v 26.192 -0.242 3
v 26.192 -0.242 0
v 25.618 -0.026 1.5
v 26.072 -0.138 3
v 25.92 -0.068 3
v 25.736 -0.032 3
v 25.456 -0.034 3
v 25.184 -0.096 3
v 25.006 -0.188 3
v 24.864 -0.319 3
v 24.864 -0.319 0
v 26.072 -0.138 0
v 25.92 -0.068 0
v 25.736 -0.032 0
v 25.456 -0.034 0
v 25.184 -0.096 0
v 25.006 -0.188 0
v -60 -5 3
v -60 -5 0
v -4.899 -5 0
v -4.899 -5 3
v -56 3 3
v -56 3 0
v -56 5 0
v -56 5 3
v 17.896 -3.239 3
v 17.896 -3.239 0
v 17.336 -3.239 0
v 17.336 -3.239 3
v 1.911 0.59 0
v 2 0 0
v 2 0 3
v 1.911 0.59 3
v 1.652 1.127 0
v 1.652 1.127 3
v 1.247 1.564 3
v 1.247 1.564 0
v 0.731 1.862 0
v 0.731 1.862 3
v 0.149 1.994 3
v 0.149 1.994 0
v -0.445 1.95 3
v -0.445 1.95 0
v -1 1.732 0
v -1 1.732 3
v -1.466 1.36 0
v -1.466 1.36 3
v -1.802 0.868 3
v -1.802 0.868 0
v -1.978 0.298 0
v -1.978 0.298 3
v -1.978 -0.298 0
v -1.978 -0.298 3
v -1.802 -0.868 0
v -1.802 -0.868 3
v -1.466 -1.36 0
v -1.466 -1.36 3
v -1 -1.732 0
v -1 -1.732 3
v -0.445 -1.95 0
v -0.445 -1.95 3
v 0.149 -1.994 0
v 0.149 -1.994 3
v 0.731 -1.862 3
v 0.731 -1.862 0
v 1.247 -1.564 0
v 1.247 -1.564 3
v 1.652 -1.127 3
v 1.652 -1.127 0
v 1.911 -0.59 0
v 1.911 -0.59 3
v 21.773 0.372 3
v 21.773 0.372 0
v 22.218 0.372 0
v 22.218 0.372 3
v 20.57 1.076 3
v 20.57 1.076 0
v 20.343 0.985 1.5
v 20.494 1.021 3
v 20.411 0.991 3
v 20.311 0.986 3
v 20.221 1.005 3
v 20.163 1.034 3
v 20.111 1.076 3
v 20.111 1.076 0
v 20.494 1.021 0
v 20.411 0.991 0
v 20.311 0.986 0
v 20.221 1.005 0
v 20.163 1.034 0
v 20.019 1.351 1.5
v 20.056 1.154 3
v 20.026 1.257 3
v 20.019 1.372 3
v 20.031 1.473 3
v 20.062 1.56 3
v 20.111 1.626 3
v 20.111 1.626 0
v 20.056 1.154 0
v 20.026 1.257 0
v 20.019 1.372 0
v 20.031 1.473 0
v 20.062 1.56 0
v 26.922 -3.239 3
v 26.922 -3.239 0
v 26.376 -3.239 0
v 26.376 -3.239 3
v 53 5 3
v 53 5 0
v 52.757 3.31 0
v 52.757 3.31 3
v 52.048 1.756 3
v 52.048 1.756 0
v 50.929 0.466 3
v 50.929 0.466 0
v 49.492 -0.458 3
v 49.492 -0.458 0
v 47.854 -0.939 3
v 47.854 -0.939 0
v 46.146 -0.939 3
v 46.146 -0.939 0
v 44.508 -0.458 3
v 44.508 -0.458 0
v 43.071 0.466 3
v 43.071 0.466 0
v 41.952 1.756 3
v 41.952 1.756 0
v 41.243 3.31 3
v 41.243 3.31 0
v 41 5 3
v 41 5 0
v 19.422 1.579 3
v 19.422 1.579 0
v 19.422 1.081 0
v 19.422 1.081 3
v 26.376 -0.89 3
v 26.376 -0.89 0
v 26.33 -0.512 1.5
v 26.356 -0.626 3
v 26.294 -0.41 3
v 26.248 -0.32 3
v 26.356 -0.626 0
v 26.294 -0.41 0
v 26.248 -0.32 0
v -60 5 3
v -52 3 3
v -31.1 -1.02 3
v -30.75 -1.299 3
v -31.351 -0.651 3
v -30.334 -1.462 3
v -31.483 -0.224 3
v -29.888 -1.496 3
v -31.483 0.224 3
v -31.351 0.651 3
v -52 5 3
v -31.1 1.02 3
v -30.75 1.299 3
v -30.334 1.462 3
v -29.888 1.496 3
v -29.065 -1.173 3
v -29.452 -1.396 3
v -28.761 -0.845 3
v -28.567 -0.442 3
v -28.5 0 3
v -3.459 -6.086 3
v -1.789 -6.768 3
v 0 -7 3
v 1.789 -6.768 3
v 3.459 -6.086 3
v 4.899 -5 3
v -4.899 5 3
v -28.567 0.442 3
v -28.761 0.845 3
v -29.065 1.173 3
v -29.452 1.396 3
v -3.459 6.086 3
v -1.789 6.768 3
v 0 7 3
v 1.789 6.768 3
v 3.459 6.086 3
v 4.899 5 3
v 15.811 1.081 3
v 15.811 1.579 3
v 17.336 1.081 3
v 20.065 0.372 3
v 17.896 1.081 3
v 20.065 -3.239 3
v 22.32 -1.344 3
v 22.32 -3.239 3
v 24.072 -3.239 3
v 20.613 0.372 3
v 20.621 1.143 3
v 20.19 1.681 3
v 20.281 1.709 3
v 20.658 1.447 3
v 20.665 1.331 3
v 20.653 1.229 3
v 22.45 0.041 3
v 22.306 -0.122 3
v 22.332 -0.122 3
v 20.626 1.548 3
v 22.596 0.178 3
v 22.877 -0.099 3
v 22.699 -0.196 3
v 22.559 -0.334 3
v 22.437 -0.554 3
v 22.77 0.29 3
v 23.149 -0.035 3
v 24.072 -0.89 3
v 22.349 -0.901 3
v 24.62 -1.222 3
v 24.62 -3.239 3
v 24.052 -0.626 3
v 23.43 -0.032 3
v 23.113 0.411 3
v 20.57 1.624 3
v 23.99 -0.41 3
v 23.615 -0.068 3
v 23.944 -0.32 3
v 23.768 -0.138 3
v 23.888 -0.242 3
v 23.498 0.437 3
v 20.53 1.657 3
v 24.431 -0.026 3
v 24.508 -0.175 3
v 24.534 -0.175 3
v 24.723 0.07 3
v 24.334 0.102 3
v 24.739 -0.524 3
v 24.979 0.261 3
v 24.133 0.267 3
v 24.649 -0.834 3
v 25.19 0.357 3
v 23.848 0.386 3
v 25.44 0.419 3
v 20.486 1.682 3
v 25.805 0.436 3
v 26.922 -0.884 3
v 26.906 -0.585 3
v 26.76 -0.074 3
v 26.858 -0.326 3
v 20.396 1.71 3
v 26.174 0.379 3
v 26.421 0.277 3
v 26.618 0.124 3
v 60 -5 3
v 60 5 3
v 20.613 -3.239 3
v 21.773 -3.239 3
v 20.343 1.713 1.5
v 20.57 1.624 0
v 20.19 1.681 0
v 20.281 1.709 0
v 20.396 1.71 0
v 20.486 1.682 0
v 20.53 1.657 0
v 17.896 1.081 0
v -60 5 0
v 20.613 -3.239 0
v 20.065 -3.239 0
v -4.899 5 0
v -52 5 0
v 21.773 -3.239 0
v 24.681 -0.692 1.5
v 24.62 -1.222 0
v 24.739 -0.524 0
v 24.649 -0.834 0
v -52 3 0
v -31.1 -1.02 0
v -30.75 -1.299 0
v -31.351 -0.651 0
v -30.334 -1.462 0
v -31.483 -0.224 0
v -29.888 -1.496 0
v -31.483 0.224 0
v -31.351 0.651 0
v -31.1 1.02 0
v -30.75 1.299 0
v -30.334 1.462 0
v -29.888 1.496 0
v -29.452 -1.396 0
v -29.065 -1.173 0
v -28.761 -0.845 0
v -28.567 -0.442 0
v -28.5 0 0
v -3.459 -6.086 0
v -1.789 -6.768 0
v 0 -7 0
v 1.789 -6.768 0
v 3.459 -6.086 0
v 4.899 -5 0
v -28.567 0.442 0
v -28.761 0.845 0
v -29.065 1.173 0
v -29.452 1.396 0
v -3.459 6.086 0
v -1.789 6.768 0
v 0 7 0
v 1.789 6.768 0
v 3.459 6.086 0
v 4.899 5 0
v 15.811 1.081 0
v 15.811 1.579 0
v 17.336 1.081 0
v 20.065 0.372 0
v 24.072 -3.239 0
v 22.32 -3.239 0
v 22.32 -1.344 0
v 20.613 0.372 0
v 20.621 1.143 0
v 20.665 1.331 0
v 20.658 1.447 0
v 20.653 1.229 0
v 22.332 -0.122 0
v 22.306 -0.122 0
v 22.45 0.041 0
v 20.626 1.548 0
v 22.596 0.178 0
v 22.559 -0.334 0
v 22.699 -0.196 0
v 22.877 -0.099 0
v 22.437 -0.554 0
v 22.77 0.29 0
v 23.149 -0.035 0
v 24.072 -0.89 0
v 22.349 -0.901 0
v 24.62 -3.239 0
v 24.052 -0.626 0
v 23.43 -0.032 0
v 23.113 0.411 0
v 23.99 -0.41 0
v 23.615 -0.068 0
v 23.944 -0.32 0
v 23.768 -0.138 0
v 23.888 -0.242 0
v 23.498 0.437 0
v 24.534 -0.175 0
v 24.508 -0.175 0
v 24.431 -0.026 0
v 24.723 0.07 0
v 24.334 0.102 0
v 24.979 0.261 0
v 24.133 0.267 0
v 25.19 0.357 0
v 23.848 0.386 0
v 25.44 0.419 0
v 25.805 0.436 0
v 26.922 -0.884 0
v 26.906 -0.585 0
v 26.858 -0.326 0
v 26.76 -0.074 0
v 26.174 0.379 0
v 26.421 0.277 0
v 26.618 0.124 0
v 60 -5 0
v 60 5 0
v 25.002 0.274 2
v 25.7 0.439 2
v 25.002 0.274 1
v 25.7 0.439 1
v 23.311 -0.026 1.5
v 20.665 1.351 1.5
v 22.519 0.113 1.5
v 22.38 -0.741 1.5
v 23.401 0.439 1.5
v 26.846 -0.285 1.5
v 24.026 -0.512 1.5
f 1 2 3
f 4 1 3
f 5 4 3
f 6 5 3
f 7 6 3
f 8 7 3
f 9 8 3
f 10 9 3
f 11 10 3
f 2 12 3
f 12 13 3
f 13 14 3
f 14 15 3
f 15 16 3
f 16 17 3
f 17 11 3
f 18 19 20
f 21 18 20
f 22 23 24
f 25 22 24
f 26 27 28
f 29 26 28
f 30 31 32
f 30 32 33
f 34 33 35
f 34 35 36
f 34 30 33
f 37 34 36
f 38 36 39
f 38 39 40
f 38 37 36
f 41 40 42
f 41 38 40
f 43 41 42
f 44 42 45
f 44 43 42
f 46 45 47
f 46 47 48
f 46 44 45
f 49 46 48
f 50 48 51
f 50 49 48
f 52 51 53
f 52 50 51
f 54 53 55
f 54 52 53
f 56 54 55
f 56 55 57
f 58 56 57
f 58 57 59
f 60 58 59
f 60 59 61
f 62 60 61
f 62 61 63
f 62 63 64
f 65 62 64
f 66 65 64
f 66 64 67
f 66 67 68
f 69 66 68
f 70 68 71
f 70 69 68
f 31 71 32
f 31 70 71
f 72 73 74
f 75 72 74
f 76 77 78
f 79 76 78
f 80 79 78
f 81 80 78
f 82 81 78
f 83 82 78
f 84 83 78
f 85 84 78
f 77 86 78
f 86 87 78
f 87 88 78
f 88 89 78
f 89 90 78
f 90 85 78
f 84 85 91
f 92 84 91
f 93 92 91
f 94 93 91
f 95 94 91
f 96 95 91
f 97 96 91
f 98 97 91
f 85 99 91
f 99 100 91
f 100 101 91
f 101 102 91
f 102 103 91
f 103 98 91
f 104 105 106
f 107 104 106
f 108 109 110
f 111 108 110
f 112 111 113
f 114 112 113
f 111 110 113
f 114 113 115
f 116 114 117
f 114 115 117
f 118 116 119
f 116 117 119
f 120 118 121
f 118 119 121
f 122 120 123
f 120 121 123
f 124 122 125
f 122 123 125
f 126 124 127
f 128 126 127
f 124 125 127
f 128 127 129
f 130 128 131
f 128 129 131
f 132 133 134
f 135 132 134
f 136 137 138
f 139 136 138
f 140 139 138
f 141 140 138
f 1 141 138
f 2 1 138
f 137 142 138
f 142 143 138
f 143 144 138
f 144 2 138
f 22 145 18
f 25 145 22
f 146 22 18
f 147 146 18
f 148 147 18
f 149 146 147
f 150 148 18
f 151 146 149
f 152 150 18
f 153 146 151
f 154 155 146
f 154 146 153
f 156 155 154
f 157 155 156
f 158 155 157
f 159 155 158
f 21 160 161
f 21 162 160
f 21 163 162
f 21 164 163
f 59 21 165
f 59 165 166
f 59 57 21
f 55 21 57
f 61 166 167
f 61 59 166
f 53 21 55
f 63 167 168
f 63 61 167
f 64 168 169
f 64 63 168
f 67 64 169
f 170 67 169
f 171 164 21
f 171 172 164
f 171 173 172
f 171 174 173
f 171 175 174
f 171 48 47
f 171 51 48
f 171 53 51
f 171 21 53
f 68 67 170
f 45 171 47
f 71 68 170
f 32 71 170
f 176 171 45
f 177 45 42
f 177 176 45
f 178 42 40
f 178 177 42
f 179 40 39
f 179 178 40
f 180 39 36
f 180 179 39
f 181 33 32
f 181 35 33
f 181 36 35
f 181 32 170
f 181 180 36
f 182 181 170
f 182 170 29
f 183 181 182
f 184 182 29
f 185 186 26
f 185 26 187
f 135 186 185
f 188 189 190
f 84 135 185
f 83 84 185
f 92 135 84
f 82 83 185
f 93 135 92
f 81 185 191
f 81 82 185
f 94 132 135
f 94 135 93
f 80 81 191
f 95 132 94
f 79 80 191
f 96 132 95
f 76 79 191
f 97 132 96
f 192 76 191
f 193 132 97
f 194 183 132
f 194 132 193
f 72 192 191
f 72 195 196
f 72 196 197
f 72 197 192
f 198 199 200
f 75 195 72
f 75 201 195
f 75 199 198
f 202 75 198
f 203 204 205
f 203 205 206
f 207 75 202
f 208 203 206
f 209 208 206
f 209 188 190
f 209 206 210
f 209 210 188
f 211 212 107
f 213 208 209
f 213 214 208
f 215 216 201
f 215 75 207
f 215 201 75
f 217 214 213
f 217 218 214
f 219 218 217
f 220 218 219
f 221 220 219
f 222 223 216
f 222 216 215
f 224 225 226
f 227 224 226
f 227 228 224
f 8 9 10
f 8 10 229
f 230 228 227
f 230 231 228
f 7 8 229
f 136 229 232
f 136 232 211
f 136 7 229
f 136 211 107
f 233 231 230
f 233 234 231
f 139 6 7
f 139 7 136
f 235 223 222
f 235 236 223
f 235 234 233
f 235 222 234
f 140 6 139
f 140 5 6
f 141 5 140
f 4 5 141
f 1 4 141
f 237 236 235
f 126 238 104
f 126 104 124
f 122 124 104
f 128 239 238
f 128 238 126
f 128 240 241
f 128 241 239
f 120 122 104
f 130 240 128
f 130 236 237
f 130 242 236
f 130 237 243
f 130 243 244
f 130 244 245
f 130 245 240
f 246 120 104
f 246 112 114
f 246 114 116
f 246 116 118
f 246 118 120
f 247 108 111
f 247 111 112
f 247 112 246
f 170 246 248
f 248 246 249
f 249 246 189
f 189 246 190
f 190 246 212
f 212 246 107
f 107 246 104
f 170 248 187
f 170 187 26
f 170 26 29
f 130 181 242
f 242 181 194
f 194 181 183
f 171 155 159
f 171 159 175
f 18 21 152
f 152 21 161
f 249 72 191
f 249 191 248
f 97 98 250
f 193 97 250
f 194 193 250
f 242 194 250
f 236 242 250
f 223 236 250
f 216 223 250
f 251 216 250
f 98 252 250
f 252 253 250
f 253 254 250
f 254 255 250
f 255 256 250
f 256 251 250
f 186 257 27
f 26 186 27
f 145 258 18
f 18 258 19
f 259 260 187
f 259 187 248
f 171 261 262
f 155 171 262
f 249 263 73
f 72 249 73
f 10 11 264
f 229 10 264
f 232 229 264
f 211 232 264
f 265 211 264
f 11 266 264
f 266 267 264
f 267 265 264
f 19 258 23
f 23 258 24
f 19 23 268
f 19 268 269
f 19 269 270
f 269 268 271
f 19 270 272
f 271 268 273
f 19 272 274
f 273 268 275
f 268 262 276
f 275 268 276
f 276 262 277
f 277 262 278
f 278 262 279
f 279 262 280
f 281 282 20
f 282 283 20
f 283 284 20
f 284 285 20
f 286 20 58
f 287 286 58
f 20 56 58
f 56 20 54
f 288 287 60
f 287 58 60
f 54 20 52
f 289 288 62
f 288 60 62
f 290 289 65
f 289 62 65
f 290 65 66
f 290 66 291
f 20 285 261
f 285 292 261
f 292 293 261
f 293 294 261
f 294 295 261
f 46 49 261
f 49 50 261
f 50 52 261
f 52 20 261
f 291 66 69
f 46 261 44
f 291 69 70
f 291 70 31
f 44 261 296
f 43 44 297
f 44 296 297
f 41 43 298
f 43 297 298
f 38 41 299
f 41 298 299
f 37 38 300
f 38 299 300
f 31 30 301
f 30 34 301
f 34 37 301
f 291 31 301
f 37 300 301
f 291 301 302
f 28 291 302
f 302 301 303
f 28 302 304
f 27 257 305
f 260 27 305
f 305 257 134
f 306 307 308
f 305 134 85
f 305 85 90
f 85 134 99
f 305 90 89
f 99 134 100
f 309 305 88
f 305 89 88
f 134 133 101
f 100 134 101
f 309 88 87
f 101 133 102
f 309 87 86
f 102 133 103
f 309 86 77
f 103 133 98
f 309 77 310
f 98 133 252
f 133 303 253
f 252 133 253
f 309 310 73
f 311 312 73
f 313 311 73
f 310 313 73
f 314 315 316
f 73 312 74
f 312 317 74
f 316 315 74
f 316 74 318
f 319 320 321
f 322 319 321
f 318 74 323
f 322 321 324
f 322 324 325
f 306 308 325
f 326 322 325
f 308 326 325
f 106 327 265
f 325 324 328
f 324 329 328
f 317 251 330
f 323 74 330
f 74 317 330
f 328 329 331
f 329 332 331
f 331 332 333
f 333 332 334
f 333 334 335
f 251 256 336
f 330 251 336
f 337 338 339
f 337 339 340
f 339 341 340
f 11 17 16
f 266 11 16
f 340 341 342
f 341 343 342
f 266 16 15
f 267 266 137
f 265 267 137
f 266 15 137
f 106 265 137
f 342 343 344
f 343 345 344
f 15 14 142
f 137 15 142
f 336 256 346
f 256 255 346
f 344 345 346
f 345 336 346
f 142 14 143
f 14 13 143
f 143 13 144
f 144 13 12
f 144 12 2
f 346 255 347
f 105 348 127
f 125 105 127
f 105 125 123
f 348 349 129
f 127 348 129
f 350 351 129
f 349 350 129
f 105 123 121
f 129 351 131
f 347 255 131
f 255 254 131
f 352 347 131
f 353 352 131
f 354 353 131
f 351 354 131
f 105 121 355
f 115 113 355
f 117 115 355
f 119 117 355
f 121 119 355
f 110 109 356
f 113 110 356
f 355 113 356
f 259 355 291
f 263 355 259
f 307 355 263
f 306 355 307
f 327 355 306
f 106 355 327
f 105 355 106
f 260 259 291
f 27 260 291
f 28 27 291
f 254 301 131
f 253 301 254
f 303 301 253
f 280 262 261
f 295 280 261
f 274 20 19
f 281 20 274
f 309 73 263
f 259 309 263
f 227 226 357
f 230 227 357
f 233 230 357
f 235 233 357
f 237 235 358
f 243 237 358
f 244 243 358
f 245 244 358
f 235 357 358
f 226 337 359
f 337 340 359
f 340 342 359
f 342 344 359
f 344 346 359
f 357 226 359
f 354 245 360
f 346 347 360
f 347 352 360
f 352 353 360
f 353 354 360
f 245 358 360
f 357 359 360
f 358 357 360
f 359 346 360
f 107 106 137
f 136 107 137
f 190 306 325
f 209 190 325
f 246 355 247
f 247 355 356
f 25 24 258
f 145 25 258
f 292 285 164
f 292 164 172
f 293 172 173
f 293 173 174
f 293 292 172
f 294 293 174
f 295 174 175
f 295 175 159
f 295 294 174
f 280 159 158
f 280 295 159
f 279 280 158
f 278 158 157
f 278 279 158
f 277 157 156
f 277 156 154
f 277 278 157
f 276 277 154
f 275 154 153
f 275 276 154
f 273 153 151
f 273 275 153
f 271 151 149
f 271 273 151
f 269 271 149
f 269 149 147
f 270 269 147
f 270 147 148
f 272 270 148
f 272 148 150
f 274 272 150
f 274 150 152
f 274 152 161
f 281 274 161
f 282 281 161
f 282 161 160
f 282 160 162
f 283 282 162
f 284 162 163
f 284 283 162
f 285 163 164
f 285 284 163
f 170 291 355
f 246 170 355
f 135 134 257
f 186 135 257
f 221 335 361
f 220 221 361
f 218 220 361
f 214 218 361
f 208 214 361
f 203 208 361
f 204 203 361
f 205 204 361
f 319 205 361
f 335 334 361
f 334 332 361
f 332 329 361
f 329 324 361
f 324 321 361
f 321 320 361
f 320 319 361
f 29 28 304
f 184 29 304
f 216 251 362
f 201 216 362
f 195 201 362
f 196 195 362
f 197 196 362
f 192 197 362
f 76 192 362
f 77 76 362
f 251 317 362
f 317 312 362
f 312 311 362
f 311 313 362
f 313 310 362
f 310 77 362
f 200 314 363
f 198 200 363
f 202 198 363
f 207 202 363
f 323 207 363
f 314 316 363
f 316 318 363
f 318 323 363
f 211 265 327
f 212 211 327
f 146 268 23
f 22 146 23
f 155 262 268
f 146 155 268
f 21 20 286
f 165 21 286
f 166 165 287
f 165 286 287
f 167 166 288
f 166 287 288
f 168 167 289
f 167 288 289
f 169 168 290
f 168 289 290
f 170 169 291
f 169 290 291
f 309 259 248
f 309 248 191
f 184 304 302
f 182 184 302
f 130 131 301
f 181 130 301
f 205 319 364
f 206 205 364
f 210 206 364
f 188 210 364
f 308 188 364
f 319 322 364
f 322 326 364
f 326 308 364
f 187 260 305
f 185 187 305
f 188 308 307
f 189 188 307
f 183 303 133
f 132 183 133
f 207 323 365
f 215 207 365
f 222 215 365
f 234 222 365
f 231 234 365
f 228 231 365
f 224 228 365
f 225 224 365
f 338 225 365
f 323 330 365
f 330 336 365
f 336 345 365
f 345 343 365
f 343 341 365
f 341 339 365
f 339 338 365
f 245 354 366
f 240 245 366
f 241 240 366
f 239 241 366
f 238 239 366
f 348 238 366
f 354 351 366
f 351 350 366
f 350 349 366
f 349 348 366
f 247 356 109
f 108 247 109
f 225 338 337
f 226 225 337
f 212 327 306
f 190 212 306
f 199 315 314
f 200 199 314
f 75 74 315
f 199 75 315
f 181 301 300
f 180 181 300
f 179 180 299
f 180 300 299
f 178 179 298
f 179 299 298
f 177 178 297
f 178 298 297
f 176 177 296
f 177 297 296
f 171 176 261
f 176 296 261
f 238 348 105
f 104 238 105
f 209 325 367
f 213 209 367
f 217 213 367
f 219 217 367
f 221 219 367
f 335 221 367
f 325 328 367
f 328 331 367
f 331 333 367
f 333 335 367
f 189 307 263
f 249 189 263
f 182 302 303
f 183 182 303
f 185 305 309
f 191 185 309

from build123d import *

# Parameters (mm, degrees)
F0_R     = 1.5
F0_R_2   = 2
F0_W     = 0.5472596904
F0_H     = 3.6114921765
F1_DEPTH = 3


with BuildPart() as f1:
    # F0 (on Top) → F1 (new body)
    with BuildSketch(Plane.XY):
        with BuildLine():
            Line((4.8989794856, -5), (-4.8989794856, -5))
            ThreePointArc((-4.8989794856, -5), (0, -7), (4.8989794856, -5))
        make_face()
        with BuildLine():
            ThreePointArc((4.8989794856, 5), (0, 7), (-4.8989794856, 5))
            Line((-4.8989794856, 5), (4.8989794856, 5))
        make_face()
        with BuildLine():
            Line((-60, 5), (-60, -5))
            Line((-60, -5), (-4.8989794856, -5))
            ThreePointArc((-4.8989794856, -5), (-7, 0), (-4.8989794856, 5))
            Line((-4.8989794856, 5), (-52, 5))
            Line((-52, 5), (-52, 3))
            Line((-52, 3), (-56, 3))
            Line((-56, 3), (-56, 5))
            Line((-56, 5), (-60, 5))
        make_face()
        with Locations((-30, 0)):
            Circle(F0_R, mode=Mode.SUBTRACT)
        with BuildLine():
            ThreePointArc((-4.8989794856, 5), (-7, 0), (-4.8989794856, -5))
            Line((-4.8989794856, -5), (4.8989794856, -5))
            ThreePointArc((4.8989794856, -5), (6.4534043883, -2.7117470016), (7, 0))
            ThreePointArc((7, 0), (6.4534043883, 2.7117470016), (4.8989794856, 5))
            Line((4.8989794856, 5), (-4.8989794856, 5))
        make_face()
        Circle(F0_R_2, mode=Mode.SUBTRACT)
        with BuildLine():
            ThreePointArc((7, 0), (6.4534043883, -2.7117470016), (4.8989794856, -5))
            Line((4.8989794856, -5), (60, -5))
            Line((60, -5), (60, 5))
            Line((60, 5), (53, 5))
            ThreePointArc((53, 5), (47, -1), (41, 5))
            Line((41, 5), (4.8989794856, 5))
            ThreePointArc((4.8989794856, 5), (6.4534043883, 2.7117470016), (7, 0))
        make_face()
        with Locations((20.3390103817, -1.4335251428)):
            Rectangle(F0_W, F0_H, mode=Mode.SUBTRACT)
        with BuildLine():
            Line((26.9224706456, -3.239271231), (26.3762654055, -3.239271231))
            Line((26.3762654055, -3.239271231), (26.3762654055, -0.8899560283))
            add(Edge.make_bspline(
                [(26.3762654055, -0.8899560283), (26.3762654055, -0.4576314174), (26.1917366082, -0.2419963371)],
                knots=[0, 0, 0, 1, 1, 1], degree=2))
            add(Edge.make_bspline(
                [(26.1917366082, -0.2419963371), (26.0072078108, -0.0263612568), (25.618115661, -0.0263612568)],
                knots=[0, 0, 0, 1, 1, 1], degree=2))
            add(Edge.make_bspline(
                [(25.618115661, -0.0263612568), (25.1077617301, -0.0263612568), (24.8636564925, -0.319498432)],
                knots=[0, 0, 0, 1, 1, 1], degree=2))
            add(Edge.make_bspline(
                [(24.8636564925, -0.319498432), (24.6195512548, -0.6126356072), (24.6195512548, -1.2221078635)],
                knots=[0, 0, 0, 1, 1, 1], degree=2))
            Line((24.6195512548, -1.2221078635), (24.6195512548, -3.239271231))
            Line((24.6195512548, -3.239271231), (24.0722915645, -3.239271231))
            Line((24.0722915645, -3.239271231), (24.0722915645, -0.8899560283))
            add(Edge.make_bspline(
                [(24.0722915645, -0.8899560283), (24.0722915645, -0.4576314174), (23.8877627671, -0.2419963371)],
                knots=[0, 0, 0, 1, 1, 1], degree=2))
            add(Edge.make_bspline(
                [(23.8877627671, -0.2419963371), (23.7032339698, -0.0263612568), (23.3109784692, -0.0263612568)],
                knots=[0, 0, 0, 1, 1, 1], degree=2))
            add(Edge.make_bspline(
                [(23.3109784692, -0.0263612568), (22.7974611874, -0.0263612568), (22.5586282011, -0.3342607358)],
                knots=[0, 0, 0, 1, 1, 1], degree=2))
            add(Edge.make_bspline(
                [(22.5586282011, -0.3342607358), (22.3197952149, -0.6421602147), (22.3197952149, -1.3444240949)],
                knots=[0, 0, 0, 1, 1, 1], degree=2))
            Line((22.3197952149, -1.3444240949), (22.3197952149, -3.239271231))
            Line((22.3197952149, -3.239271231), (21.7725355245, -3.239271231))
            Line((21.7725355245, -3.239271231), (21.7725355245, 0.3722209455))
            Line((21.7725355245, 0.3722209455), (22.2175135386, 0.3722209455))
            Line((22.2175135386, 0.3722209455), (22.3060873614, -0.1223162314))
            Line((22.3060873614, -0.1223162314), (22.3324486181, -0.1223162314))
            add(Edge.make_bspline(
                [(22.3324486181, -0.1223162314), (22.4874528079, 0.1412963362), (22.7695182552, 0.2899738244)],
                knots=[0, 0, 0, 1, 1, 1], degree=2))
            add(Edge.make_bspline(
                [(22.7695182552, 0.2899738244), (23.0515837026, 0.4386513125), (23.4006067421, 0.4386513125)],
                knots=[0, 0, 0, 1, 1, 1], degree=2))
            add(Edge.make_bspline(
                [(23.4006067421, 0.4386513125), (24.2473303094, 0.4386513125), (24.5077795262, -0.1750387449)],
                knots=[0, 0, 0, 1, 1, 1], degree=2))
            Line((24.5077795262, -0.1750387449), (24.5341407829, -0.1750387449))
            add(Edge.make_bspline(
                [(24.5341407829, -0.1750387449), (24.6954716743, 0.1086083779), (25.0017894779, 0.2736298452)],
                knots=[0, 0, 0, 1, 1, 1], degree=2))
            add(Edge.make_bspline(
                [(25.0017894779, 0.2736298452), (25.3081072815, 0.4386513125), (25.7003627821, 0.4386513125)],
                knots=[0, 0, 0, 1, 1, 1], degree=2))
            add(Edge.make_bspline(
                [(25.7003627821, 0.4386513125), (26.3129983893, 0.4386513125), (26.6177345175, 0.1238979068)],
                knots=[0, 0, 0, 1, 1, 1], degree=2))
            add(Edge.make_bspline(
                [(26.6177345175, 0.1238979068), (26.9224706456, -0.190855499), (26.9224706456, -0.8836293267)],
                knots=[0, 0, 0, 1, 1, 1], degree=2))
            Line((26.9224706456, -0.8836293267), (26.9224706456, -3.239271231))
        make_face(mode=Mode.SUBTRACT)
        Polygon((17.8963763301, 1.0808115273), (17.8963763301, -3.239271231), (17.3364632365, -3.239271231), (17.3364632365, 1.0808115273), (15.810673695, 1.0808115273), (15.810673695, 1.5785120549), (19.4221658715, 1.5785120549), (19.4221658715, 1.0808115273), align=None, mode=Mode.SUBTRACT)
        with BuildLine():
            add(Edge.make_bspline(
                [(20.1112491233, 1.0755392759), (20.0189847246, 1.1662219992), (20.0189847246, 1.3507507965)],
                knots=[0, 0, 0, 1, 1, 1], degree=2))
            add(Edge.make_bspline(
                [(20.0189847246, 1.3507507965), (20.0189847246, 1.5384429447), (20.1112491233, 1.6259623171)],
                knots=[0, 0, 0, 1, 1, 1], degree=2))
            add(Edge.make_bspline(
                [(20.1112491233, 1.6259623171), (20.203513522, 1.7134816896), (20.3427009577, 1.7134816896)],
                knots=[0, 0, 0, 1, 1, 1], degree=2))
            add(Edge.make_bspline(
                [(20.3427009577, 1.7134816896), (20.4745072415, 1.7134816896), (20.569934991, 1.6243806417)],
                knots=[0, 0, 0, 1, 1, 1], degree=2))
            add(Edge.make_bspline(
                [(20.569934991, 1.6243806417), (20.6653627404, 1.5352795939), (20.6653627404, 1.3507507965)],
                knots=[0, 0, 0, 1, 1, 1], degree=2))
            add(Edge.make_bspline(
                [(20.6653627404, 1.3507507965), (20.6653627404, 1.1662219992), (20.569934991, 1.0755392759)],
                knots=[0, 0, 0, 1, 1, 1], degree=2))
            add(Edge.make_bspline(
                [(20.569934991, 1.0755392759), (20.4745072415, 0.9848565527), (20.3427009577, 0.9848565527)],
                knots=[0, 0, 0, 1, 1, 1], degree=2))
            add(Edge.make_bspline(
                [(20.3427009577, 0.9848565527), (20.203513522, 0.9848565527), (20.1112491233, 1.0755392759)],
                knots=[0, 0, 0, 1, 1, 1], degree=2))
        make_face(mode=Mode.SUBTRACT)
    extrude(amount=F1_DEPTH)


solid = f1.part
